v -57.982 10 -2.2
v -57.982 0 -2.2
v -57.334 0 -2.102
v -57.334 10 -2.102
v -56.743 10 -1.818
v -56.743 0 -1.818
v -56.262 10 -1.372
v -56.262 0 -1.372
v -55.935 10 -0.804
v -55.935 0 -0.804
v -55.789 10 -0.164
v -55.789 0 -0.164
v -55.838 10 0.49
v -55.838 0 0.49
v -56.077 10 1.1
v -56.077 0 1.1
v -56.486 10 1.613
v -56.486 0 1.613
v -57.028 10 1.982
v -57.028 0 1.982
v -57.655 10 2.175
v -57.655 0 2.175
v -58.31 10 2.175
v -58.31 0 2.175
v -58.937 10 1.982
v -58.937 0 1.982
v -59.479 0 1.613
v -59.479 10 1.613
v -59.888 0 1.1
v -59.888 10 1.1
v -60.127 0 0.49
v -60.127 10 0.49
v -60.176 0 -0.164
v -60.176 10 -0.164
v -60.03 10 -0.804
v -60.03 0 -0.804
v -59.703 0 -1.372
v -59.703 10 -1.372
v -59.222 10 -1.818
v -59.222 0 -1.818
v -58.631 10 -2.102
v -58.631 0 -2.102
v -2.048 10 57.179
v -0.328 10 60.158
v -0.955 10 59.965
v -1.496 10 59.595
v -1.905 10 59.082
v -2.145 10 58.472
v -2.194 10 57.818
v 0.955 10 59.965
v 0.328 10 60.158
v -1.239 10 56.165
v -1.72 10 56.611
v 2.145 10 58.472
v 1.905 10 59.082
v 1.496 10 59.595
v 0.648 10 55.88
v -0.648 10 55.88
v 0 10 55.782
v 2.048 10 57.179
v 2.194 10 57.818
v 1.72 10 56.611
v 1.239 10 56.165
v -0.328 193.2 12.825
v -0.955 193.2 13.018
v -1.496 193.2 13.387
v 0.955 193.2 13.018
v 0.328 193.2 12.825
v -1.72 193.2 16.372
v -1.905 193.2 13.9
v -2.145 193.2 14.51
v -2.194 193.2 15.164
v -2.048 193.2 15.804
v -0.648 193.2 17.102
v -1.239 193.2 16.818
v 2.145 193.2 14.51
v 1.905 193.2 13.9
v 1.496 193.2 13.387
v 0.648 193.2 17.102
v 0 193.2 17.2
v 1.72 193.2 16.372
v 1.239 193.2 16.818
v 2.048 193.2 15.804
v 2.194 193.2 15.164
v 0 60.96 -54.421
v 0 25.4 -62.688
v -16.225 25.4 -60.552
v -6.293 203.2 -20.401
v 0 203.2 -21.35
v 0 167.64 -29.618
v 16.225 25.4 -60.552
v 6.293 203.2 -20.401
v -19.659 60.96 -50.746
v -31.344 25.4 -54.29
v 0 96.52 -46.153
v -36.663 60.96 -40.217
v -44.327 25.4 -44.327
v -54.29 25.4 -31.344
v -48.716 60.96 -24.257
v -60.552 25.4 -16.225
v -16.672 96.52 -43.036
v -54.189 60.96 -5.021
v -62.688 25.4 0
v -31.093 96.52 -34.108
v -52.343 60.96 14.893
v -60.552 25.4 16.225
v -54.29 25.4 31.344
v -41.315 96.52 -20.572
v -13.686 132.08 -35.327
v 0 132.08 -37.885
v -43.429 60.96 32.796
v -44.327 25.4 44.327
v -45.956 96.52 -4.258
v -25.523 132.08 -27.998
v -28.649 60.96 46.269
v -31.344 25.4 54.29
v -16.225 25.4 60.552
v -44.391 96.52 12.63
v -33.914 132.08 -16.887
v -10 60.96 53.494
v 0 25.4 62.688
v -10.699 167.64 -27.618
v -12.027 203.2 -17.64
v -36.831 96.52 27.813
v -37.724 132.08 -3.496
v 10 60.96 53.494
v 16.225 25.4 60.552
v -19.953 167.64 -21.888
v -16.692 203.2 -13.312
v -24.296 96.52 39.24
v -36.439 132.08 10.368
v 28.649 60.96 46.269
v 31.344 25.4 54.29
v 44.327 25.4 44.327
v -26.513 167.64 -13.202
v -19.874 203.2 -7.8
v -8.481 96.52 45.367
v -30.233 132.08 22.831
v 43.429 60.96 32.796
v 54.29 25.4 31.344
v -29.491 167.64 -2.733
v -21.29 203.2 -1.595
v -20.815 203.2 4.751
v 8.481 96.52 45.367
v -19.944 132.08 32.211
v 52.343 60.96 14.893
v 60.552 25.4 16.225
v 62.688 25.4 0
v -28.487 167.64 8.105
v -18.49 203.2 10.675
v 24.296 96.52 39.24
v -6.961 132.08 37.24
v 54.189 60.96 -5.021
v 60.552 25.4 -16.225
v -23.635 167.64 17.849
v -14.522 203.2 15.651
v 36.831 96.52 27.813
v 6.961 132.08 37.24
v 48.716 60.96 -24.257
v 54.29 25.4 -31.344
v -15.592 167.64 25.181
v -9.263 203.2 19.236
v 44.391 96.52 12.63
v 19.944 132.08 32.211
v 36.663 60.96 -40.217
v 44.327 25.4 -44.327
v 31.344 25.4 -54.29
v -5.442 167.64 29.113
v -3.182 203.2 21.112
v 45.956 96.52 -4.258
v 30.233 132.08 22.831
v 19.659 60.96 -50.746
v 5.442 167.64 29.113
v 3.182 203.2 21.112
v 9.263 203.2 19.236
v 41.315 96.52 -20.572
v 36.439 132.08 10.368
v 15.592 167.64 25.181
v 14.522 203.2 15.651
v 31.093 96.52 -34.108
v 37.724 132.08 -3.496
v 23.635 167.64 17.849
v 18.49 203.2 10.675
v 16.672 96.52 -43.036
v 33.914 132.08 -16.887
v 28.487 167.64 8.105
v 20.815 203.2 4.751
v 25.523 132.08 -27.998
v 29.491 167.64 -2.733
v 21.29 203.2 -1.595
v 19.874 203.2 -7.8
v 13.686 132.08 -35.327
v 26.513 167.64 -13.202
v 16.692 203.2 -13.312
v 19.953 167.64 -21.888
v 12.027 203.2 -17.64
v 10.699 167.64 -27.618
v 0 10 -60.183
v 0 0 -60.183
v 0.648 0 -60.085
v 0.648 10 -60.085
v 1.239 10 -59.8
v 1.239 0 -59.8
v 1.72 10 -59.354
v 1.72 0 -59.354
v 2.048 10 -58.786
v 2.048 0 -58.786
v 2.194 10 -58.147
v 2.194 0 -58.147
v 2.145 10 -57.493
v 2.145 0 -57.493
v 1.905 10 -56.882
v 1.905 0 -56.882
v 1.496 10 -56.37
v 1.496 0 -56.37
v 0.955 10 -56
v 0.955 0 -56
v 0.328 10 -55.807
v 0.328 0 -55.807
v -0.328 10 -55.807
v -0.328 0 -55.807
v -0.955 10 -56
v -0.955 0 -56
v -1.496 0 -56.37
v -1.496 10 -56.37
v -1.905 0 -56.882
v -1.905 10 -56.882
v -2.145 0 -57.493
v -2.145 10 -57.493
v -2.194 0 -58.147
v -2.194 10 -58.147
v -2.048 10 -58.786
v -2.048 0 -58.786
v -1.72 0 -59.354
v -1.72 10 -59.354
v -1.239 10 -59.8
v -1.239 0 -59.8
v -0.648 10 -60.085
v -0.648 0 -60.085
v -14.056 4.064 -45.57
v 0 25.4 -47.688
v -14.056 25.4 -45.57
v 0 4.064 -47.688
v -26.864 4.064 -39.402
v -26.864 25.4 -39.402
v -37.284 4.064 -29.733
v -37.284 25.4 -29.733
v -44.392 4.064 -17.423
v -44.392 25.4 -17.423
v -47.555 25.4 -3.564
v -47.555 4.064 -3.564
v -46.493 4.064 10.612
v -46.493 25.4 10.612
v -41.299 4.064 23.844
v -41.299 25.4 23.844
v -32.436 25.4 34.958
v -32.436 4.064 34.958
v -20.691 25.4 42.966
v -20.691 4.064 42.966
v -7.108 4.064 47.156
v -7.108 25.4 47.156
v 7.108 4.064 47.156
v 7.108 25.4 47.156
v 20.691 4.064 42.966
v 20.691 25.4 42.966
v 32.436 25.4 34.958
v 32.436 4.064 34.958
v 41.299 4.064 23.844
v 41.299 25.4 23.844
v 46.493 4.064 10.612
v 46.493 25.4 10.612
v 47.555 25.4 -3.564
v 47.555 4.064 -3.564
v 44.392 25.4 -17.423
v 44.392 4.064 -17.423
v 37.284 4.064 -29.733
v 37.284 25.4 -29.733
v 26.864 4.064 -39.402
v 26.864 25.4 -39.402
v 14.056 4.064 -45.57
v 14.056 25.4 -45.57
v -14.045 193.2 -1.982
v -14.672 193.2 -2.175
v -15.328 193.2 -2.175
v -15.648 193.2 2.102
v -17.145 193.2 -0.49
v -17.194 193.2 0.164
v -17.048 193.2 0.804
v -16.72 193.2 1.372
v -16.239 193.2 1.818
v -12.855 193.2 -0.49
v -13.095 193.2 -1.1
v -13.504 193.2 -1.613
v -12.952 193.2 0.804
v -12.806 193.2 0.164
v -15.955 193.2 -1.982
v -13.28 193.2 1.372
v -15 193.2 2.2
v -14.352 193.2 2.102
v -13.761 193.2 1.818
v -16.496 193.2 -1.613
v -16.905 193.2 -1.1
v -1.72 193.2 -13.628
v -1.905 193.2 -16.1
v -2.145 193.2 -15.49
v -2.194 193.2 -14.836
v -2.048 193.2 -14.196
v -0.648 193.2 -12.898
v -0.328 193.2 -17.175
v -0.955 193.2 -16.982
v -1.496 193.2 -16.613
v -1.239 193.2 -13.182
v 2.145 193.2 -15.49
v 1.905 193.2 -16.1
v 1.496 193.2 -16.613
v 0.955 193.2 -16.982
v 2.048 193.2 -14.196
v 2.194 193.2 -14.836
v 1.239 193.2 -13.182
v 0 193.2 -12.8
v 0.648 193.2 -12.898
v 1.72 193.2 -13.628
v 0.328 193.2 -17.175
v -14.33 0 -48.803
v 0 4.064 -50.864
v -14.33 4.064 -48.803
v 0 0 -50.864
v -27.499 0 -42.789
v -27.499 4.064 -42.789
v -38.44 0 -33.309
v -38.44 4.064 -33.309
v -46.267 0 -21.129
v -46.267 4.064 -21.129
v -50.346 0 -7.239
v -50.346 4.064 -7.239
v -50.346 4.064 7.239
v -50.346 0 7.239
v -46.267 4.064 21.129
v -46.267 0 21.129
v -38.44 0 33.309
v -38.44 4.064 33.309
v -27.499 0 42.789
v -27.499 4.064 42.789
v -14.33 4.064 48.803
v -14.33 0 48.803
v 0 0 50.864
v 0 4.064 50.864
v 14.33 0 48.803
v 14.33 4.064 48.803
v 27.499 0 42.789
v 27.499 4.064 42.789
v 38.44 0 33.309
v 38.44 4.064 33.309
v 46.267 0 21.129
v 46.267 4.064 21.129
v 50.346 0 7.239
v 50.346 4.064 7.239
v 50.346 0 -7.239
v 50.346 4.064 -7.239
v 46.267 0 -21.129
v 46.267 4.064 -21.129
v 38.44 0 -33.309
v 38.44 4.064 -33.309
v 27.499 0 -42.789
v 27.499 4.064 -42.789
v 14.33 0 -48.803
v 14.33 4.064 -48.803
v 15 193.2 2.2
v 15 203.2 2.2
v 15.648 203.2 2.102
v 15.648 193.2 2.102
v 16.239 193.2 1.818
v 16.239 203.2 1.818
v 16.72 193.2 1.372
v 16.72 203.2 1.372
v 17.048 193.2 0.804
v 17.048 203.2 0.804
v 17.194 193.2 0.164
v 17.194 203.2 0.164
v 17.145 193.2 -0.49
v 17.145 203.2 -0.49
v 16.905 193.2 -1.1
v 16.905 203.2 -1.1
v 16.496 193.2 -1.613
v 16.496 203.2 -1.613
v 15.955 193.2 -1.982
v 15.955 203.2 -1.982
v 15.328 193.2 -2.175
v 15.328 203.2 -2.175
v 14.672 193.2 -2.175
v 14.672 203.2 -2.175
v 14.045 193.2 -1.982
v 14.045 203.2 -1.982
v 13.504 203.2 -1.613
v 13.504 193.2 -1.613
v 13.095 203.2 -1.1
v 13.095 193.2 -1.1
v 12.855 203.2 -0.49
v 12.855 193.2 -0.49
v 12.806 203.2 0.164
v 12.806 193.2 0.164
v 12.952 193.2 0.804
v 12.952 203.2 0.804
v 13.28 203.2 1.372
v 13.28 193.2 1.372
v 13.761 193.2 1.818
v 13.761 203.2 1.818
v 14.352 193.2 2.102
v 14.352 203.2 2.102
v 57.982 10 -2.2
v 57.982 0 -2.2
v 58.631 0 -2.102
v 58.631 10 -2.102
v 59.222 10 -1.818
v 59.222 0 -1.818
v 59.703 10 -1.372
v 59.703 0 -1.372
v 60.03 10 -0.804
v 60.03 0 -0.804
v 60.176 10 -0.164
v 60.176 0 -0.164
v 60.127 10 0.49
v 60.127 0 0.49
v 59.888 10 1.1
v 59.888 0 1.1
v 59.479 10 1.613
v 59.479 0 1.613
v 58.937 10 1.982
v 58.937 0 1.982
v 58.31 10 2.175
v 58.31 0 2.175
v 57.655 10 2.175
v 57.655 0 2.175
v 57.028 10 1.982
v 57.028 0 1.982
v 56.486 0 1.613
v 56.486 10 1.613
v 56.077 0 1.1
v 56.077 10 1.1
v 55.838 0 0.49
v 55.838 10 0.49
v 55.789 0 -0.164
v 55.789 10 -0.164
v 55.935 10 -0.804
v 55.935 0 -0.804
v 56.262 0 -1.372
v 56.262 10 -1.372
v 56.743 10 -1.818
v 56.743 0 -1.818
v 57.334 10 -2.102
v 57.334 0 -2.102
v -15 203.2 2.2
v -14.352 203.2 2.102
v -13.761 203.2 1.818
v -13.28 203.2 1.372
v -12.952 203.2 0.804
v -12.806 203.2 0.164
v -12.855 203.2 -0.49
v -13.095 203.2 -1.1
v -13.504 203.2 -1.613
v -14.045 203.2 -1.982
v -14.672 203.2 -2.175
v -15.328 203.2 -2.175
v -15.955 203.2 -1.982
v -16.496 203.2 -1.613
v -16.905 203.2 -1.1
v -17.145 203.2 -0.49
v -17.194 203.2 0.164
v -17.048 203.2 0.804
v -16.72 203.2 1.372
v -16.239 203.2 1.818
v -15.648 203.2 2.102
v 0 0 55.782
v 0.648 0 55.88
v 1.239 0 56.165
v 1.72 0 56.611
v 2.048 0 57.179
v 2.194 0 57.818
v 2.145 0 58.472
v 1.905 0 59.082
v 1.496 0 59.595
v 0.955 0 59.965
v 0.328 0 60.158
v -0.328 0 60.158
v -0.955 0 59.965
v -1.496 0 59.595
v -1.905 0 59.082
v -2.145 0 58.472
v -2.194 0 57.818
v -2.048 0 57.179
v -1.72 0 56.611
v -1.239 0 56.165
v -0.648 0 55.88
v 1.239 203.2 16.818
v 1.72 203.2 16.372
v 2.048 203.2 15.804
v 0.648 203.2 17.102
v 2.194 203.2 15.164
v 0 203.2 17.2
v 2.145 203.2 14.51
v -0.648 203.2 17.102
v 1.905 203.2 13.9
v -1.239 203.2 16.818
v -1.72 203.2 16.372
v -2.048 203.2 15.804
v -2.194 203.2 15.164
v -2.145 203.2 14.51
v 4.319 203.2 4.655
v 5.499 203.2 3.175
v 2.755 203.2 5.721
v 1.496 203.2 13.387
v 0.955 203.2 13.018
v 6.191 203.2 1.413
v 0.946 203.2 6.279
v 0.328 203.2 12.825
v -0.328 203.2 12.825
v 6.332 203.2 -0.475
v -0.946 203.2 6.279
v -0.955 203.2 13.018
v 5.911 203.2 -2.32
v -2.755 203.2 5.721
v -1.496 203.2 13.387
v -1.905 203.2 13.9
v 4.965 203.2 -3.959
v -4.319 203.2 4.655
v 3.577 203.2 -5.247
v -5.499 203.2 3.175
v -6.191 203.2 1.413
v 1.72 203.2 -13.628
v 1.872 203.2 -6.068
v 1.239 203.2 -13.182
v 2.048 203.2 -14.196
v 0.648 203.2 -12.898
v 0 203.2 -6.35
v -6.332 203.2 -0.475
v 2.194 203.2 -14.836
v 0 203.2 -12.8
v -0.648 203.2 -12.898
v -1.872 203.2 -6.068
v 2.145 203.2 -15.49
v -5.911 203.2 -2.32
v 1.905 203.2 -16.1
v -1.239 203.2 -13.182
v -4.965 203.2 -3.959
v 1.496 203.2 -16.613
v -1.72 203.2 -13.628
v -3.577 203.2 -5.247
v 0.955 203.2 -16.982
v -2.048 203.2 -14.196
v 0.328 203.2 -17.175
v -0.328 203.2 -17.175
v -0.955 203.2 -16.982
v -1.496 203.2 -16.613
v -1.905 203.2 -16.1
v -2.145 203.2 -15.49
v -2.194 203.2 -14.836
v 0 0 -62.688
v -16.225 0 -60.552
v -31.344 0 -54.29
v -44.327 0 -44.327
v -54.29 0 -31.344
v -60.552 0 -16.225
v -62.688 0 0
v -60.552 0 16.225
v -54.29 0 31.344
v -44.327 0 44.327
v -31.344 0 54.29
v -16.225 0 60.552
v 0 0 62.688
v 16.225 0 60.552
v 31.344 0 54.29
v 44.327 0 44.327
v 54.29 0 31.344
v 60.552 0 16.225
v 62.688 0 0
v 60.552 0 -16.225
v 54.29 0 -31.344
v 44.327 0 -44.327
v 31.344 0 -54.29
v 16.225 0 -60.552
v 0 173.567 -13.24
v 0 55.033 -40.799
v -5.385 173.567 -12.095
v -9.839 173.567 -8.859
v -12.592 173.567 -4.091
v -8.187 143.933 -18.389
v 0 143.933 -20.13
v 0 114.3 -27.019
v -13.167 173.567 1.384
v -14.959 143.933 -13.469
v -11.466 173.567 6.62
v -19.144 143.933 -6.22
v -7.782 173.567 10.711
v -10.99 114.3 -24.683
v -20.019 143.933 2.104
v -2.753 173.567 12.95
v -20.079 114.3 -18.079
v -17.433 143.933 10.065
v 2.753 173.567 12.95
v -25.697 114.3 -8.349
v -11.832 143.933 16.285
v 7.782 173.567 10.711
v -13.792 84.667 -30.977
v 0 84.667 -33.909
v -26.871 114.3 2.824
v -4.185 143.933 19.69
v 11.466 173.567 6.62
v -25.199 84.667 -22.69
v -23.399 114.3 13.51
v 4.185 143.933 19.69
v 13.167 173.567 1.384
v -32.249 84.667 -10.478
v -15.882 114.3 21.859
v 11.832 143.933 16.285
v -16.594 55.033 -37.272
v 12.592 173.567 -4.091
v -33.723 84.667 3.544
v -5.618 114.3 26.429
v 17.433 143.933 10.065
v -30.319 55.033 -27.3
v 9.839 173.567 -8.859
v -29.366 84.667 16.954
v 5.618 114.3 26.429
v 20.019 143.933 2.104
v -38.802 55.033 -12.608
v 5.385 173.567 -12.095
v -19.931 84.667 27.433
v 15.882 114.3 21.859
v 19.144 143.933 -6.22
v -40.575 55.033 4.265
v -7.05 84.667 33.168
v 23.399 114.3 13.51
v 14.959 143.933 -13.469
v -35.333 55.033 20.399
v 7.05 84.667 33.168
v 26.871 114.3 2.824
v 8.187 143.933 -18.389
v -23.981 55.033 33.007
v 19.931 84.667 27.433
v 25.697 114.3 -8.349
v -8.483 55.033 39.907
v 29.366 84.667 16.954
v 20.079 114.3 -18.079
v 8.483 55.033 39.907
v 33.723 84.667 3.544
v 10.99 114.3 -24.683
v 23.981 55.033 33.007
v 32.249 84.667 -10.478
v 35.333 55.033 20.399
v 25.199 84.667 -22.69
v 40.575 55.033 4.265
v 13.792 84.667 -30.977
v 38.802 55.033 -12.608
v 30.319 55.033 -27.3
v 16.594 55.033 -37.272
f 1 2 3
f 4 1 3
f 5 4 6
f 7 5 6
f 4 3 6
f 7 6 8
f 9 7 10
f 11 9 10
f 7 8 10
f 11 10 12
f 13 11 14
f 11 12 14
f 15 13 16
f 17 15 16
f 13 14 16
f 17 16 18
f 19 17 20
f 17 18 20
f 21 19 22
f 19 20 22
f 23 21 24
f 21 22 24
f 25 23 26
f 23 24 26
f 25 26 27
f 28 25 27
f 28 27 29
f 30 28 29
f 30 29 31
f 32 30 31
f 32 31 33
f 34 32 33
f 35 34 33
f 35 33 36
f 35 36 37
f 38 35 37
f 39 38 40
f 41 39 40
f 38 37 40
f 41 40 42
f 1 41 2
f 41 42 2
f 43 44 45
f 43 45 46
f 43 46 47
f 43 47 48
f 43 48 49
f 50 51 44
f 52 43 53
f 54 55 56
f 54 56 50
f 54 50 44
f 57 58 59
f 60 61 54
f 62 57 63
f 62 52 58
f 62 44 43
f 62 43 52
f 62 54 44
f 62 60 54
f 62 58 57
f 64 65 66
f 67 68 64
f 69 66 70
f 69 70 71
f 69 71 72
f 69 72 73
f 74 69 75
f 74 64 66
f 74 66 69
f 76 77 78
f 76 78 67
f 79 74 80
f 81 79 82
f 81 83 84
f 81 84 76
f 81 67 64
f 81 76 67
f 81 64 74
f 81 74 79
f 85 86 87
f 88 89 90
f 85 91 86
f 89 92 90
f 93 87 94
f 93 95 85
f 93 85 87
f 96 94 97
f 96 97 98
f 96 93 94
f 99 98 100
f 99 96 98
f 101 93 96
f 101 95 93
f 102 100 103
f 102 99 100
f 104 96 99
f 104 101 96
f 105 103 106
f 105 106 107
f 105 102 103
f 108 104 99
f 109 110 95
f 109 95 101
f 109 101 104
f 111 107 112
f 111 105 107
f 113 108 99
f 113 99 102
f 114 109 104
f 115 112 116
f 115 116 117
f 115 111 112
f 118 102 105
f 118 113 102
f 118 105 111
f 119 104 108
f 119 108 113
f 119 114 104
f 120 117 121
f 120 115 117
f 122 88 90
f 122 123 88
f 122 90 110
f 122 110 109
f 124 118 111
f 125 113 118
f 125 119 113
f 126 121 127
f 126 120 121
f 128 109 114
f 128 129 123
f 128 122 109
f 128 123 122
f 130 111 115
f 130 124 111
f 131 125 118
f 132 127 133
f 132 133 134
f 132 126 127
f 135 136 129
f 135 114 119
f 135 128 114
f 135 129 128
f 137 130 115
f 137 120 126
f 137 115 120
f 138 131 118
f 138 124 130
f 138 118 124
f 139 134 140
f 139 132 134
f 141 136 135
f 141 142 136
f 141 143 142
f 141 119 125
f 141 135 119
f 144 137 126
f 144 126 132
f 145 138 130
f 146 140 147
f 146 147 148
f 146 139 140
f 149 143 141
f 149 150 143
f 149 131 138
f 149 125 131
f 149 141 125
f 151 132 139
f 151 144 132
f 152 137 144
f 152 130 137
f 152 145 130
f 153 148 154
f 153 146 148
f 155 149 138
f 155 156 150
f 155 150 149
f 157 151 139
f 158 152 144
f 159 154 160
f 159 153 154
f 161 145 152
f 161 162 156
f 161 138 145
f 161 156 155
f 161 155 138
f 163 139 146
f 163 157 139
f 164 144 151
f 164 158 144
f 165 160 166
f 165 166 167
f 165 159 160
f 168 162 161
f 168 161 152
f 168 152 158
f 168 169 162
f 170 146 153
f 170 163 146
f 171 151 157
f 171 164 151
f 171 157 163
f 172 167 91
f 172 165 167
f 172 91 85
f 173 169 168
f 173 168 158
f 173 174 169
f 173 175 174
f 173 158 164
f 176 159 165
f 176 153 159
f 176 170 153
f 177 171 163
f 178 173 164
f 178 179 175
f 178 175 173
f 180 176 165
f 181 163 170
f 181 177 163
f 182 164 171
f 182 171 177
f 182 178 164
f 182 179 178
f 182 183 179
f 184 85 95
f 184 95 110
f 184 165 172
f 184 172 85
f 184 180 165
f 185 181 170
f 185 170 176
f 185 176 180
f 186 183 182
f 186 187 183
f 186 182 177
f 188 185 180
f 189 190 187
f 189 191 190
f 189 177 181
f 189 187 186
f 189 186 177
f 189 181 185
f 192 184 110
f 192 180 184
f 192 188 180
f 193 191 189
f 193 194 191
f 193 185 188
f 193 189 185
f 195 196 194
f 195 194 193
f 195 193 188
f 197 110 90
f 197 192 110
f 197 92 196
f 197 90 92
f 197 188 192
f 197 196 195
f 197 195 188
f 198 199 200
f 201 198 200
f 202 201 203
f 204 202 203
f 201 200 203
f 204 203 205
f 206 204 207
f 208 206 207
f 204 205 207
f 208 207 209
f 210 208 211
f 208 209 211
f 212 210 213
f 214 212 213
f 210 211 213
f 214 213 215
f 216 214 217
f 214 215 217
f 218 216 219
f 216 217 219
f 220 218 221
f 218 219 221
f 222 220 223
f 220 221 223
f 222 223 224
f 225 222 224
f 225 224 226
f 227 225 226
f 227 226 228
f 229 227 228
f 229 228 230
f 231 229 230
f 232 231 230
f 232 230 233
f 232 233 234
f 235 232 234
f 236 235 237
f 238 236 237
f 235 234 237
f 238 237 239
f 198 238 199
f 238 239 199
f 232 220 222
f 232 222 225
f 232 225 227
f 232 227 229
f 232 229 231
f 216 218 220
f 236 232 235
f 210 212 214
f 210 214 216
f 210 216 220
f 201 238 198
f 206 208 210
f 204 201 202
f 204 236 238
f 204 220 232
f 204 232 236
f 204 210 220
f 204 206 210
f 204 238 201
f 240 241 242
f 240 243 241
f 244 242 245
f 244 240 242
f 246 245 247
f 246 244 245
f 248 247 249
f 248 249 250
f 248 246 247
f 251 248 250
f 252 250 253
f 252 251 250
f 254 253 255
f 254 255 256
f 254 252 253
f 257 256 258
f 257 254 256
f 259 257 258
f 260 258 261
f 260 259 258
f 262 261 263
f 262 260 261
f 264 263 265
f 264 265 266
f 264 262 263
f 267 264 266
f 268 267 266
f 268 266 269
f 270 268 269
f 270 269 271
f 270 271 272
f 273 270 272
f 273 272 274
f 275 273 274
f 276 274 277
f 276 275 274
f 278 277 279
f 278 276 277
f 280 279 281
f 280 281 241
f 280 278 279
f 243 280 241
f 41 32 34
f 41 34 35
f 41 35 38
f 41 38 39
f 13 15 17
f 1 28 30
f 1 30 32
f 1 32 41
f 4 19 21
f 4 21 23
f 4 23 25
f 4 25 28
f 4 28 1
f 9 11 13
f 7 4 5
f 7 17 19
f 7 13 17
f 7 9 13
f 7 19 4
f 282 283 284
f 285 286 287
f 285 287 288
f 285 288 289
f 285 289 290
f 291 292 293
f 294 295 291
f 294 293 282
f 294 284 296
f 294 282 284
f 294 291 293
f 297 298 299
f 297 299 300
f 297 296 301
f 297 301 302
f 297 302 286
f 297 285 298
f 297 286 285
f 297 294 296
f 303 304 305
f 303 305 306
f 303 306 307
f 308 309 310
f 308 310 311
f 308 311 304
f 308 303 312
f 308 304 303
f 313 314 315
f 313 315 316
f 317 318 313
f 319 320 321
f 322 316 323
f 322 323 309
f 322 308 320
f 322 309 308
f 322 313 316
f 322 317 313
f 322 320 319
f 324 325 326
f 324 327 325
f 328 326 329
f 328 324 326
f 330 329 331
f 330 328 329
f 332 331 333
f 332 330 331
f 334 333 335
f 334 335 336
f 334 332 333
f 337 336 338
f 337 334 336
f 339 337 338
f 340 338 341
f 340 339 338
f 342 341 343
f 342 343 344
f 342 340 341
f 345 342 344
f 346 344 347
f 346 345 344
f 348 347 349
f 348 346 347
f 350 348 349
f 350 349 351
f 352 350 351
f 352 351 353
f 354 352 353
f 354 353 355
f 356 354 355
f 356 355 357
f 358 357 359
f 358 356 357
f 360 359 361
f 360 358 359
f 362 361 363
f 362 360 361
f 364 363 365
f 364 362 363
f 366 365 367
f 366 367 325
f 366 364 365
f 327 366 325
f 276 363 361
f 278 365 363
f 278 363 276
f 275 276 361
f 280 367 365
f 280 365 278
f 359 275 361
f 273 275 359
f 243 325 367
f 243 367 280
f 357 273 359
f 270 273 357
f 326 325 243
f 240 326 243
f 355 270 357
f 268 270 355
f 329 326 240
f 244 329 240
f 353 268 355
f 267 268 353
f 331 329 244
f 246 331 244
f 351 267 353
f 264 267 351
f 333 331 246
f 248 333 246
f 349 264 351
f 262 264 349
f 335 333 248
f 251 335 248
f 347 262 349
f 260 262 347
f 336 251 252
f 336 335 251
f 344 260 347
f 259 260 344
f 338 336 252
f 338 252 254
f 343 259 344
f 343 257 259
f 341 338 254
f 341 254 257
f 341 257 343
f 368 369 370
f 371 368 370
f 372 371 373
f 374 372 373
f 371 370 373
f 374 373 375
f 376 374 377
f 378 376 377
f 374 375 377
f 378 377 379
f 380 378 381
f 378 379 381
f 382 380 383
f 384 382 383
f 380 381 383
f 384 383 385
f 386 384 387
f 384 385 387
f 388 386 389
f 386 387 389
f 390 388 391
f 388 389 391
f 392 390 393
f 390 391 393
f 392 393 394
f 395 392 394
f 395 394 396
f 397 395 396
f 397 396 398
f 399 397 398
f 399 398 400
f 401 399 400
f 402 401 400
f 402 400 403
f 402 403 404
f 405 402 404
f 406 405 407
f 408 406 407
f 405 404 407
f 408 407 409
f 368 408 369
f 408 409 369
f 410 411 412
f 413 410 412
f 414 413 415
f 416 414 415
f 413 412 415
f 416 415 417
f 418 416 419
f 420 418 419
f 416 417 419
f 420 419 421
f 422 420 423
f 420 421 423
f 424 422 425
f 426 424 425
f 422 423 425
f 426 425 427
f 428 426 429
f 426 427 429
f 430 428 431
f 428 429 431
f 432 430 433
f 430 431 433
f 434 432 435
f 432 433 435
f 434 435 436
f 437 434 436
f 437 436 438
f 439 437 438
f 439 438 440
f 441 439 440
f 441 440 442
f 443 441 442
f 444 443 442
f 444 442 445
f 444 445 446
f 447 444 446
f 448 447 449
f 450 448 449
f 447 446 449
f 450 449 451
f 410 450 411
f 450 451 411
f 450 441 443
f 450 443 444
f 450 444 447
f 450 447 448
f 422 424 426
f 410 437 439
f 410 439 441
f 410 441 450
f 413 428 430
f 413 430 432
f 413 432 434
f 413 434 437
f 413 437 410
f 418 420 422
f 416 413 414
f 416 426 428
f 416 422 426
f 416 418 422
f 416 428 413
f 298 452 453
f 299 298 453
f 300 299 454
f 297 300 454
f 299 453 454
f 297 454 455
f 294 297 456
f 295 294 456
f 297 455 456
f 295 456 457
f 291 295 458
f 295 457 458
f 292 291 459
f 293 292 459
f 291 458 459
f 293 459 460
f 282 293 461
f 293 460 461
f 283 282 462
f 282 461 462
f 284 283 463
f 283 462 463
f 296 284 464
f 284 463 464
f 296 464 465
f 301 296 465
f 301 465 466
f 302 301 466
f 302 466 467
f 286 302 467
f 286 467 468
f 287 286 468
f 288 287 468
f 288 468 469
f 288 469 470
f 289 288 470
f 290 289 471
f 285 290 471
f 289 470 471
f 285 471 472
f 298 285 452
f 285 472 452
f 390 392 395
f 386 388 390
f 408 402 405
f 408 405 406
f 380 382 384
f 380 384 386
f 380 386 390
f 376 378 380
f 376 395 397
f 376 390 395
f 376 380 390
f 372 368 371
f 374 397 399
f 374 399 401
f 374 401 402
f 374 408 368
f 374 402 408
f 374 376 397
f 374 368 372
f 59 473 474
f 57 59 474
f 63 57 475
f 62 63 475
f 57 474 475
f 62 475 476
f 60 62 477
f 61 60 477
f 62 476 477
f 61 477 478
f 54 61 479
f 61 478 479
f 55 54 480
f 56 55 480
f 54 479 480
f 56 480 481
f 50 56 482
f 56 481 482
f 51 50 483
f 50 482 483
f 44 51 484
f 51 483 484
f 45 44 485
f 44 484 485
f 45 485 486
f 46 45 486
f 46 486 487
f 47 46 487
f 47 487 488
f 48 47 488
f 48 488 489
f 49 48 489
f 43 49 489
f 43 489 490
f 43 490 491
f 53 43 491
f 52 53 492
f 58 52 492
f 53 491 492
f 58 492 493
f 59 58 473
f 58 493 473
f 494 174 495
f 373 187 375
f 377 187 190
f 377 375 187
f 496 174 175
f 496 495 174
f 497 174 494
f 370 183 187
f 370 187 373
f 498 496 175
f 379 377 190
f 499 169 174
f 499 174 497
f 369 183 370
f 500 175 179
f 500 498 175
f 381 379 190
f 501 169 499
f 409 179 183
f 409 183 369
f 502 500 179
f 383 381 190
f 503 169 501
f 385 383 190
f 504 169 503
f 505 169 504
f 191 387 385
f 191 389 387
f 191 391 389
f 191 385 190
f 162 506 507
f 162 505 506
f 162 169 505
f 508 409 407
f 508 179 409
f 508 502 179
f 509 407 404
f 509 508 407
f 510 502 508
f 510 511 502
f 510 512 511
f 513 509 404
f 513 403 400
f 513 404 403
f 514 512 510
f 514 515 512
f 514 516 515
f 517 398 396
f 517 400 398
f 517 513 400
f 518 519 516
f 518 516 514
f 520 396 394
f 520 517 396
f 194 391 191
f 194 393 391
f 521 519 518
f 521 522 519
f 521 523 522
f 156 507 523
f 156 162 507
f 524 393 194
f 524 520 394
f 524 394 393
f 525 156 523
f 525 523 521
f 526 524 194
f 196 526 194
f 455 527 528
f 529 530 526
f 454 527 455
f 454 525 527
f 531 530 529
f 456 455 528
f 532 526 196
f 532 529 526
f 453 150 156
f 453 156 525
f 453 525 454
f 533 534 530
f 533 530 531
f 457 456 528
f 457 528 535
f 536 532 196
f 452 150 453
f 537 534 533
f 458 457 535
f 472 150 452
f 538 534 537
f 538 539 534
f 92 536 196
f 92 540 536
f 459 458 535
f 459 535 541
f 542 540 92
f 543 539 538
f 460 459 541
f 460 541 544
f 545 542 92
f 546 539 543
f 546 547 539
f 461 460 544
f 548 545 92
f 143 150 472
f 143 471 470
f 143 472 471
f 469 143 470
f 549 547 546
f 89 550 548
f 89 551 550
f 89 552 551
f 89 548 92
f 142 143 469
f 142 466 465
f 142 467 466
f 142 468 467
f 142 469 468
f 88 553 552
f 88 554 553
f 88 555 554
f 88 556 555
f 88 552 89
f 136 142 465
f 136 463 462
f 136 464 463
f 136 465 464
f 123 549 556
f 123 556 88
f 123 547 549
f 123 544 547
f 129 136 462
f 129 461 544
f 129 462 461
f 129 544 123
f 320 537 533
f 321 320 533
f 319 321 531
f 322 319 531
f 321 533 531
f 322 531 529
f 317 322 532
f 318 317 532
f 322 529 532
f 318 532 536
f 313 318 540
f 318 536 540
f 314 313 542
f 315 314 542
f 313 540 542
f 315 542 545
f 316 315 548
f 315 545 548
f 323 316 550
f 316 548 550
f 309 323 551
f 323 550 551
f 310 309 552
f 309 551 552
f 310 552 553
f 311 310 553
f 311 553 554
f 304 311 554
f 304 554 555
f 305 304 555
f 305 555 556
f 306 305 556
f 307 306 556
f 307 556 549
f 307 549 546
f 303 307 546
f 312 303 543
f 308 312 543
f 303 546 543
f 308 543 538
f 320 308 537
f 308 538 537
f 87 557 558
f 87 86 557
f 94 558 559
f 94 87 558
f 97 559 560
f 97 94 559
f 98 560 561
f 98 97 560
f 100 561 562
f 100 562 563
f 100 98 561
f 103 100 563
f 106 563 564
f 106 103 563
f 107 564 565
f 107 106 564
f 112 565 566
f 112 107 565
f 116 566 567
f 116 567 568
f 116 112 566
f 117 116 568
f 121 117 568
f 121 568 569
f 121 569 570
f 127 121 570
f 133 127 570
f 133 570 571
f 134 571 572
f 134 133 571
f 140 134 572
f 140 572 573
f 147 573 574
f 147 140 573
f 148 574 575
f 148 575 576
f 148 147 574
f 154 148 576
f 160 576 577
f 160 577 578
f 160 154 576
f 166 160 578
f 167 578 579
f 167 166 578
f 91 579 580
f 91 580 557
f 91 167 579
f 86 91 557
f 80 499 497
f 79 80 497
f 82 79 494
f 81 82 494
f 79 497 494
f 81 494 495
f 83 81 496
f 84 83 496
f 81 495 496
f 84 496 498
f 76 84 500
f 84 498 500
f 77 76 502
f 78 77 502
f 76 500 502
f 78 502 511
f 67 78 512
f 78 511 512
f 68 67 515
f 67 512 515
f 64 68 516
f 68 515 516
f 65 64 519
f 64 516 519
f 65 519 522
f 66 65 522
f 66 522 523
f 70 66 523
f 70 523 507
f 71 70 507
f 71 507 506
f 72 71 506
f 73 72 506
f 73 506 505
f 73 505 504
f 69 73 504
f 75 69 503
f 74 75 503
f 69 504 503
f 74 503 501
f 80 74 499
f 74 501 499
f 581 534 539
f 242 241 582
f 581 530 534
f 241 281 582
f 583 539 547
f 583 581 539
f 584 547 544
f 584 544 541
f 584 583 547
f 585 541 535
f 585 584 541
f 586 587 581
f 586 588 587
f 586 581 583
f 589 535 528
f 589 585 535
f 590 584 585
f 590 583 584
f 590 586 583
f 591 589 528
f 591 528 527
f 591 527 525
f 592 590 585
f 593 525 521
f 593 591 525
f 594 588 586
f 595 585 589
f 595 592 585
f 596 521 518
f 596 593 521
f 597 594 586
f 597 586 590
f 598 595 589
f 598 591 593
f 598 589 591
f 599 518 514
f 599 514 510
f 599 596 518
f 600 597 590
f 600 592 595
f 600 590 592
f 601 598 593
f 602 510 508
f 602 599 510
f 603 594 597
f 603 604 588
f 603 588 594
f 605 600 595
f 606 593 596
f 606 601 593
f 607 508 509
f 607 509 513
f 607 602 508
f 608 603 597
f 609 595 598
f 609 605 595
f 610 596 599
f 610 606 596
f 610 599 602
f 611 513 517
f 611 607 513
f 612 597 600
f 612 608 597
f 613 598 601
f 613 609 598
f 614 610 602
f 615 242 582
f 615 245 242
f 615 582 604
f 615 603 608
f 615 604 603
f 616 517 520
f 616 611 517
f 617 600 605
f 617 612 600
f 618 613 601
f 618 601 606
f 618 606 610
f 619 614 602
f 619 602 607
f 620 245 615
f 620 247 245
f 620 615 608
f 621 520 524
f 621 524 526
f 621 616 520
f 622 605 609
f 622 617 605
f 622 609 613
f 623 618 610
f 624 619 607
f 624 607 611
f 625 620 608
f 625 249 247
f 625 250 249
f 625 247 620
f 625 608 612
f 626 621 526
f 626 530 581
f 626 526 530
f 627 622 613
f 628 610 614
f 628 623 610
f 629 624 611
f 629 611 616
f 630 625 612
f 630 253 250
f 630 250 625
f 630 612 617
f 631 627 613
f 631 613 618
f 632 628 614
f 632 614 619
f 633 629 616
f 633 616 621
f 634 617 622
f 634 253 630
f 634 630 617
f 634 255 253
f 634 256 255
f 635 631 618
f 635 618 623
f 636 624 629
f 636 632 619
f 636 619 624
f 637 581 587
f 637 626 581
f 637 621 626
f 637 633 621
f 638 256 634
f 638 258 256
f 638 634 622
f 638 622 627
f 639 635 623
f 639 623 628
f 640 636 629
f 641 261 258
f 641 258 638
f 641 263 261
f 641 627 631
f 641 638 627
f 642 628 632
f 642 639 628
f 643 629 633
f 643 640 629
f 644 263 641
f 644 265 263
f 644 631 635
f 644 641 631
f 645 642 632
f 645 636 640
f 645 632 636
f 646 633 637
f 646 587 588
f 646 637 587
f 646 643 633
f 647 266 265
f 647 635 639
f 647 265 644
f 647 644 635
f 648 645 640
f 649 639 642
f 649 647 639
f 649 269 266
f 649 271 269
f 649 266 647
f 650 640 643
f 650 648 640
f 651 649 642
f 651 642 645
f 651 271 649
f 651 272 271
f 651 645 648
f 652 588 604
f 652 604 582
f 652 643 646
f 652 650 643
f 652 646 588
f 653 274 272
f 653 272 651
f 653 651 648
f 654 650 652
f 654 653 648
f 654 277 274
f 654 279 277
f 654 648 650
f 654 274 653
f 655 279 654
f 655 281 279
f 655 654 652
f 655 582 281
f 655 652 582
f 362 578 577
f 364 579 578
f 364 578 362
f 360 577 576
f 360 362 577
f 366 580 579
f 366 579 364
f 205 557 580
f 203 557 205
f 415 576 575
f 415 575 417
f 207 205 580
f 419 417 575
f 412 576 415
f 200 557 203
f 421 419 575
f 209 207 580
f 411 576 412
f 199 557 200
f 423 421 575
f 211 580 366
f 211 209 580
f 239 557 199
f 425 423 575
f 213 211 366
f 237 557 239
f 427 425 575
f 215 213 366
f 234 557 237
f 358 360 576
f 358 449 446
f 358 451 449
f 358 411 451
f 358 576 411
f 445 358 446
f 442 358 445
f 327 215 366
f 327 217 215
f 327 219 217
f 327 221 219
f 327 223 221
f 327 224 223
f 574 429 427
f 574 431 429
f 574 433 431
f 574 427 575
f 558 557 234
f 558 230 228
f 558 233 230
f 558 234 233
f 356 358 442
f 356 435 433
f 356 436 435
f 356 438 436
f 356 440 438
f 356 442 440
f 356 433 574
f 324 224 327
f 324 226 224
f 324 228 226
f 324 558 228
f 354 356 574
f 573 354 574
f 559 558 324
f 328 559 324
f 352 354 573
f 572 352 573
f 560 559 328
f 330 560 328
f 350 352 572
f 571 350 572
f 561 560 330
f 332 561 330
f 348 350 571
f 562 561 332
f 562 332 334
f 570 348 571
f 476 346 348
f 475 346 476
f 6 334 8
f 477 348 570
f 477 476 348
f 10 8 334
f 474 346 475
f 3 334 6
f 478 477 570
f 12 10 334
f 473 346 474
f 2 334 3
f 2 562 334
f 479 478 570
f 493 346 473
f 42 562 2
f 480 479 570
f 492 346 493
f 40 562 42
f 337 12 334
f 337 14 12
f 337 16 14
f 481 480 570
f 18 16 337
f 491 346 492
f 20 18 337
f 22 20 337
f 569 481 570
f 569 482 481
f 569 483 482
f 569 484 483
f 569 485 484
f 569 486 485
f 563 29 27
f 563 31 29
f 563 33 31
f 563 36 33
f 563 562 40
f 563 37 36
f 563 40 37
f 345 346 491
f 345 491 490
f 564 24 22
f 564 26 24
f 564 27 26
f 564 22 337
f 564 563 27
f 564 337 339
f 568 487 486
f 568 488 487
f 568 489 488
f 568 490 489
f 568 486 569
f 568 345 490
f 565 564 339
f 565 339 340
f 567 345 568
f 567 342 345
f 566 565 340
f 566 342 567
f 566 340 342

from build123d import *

# Parameters (mm, degrees)
SKETCH3_R          = 2.2
CUT_EXTRUDE1_DEPTH = 10
SKETCH4_R          = 2.2
CUT_EXTRUDE2_DEPTH = 10


with BuildPart() as part:
    # Sketch2 → Revolve1 (revolve)
    with BuildSketch(Plane.XY, mode=Mode.PRIVATE) as revolve1_sk:
        Polygon((50.8635, 0), (62.6885, 0), (62.6885, 25.4), (21.35, 203.2), (6.35, 203.2), (47.6885, 25.4), (47.6885, 4.064), (50.8635, 4.064), align=None)
    revolve(revolve1_sk.sketch.rotate(Axis((0, 0, 0), (0, 1, 0)), 90), axis=Axis((0, 0, 0), (0, 1, 0)))

    # Sketch3 → Cut-Extrude1 (cut)
    with BuildSketch(Plane.XZ):
        with Locations(Location((-57.9825, 0, 0), (0, 0, 270))):
            Circle(SKETCH3_R)
        with Locations(Location((0, 57.9825, 0), (0, 0, 270))):
            Circle(SKETCH3_R)
        with Locations(Location((57.9825, 0, 0), (0, 0, 270))):
            Circle(SKETCH3_R)
        with Locations(Location((0, -57.9825, 0), (0, 0, 270))):
            Circle(SKETCH3_R)
    extrude(amount=-CUT_EXTRUDE1_DEPTH, mode=Mode.SUBTRACT)

    # Sketch4 → Cut-Extrude2 (cut)
    with BuildSketch(Plane(origin=(0, 203.2, 0), x_dir=(1, 0, 0), z_dir=(0, 1, 0))):
        with Locations(Location((-15, 0, 0), (0, 0, 270))):
            Circle(SKETCH4_R)
        with Locations(Location((0, 15, 0), (0, 0, 270))):
            Circle(SKETCH4_R)
        with Locations(Location((15, 0, 0), (0, 0, 270))):
            Circle(SKETCH4_R)
        with Locations(Location((0, -15, 0), (0, 0, 270))):
            Circle(SKETCH4_R)
    extrude(amount=-CUT_EXTRUDE2_DEPTH, mode=Mode.SUBTRACT)


solid = part.part
